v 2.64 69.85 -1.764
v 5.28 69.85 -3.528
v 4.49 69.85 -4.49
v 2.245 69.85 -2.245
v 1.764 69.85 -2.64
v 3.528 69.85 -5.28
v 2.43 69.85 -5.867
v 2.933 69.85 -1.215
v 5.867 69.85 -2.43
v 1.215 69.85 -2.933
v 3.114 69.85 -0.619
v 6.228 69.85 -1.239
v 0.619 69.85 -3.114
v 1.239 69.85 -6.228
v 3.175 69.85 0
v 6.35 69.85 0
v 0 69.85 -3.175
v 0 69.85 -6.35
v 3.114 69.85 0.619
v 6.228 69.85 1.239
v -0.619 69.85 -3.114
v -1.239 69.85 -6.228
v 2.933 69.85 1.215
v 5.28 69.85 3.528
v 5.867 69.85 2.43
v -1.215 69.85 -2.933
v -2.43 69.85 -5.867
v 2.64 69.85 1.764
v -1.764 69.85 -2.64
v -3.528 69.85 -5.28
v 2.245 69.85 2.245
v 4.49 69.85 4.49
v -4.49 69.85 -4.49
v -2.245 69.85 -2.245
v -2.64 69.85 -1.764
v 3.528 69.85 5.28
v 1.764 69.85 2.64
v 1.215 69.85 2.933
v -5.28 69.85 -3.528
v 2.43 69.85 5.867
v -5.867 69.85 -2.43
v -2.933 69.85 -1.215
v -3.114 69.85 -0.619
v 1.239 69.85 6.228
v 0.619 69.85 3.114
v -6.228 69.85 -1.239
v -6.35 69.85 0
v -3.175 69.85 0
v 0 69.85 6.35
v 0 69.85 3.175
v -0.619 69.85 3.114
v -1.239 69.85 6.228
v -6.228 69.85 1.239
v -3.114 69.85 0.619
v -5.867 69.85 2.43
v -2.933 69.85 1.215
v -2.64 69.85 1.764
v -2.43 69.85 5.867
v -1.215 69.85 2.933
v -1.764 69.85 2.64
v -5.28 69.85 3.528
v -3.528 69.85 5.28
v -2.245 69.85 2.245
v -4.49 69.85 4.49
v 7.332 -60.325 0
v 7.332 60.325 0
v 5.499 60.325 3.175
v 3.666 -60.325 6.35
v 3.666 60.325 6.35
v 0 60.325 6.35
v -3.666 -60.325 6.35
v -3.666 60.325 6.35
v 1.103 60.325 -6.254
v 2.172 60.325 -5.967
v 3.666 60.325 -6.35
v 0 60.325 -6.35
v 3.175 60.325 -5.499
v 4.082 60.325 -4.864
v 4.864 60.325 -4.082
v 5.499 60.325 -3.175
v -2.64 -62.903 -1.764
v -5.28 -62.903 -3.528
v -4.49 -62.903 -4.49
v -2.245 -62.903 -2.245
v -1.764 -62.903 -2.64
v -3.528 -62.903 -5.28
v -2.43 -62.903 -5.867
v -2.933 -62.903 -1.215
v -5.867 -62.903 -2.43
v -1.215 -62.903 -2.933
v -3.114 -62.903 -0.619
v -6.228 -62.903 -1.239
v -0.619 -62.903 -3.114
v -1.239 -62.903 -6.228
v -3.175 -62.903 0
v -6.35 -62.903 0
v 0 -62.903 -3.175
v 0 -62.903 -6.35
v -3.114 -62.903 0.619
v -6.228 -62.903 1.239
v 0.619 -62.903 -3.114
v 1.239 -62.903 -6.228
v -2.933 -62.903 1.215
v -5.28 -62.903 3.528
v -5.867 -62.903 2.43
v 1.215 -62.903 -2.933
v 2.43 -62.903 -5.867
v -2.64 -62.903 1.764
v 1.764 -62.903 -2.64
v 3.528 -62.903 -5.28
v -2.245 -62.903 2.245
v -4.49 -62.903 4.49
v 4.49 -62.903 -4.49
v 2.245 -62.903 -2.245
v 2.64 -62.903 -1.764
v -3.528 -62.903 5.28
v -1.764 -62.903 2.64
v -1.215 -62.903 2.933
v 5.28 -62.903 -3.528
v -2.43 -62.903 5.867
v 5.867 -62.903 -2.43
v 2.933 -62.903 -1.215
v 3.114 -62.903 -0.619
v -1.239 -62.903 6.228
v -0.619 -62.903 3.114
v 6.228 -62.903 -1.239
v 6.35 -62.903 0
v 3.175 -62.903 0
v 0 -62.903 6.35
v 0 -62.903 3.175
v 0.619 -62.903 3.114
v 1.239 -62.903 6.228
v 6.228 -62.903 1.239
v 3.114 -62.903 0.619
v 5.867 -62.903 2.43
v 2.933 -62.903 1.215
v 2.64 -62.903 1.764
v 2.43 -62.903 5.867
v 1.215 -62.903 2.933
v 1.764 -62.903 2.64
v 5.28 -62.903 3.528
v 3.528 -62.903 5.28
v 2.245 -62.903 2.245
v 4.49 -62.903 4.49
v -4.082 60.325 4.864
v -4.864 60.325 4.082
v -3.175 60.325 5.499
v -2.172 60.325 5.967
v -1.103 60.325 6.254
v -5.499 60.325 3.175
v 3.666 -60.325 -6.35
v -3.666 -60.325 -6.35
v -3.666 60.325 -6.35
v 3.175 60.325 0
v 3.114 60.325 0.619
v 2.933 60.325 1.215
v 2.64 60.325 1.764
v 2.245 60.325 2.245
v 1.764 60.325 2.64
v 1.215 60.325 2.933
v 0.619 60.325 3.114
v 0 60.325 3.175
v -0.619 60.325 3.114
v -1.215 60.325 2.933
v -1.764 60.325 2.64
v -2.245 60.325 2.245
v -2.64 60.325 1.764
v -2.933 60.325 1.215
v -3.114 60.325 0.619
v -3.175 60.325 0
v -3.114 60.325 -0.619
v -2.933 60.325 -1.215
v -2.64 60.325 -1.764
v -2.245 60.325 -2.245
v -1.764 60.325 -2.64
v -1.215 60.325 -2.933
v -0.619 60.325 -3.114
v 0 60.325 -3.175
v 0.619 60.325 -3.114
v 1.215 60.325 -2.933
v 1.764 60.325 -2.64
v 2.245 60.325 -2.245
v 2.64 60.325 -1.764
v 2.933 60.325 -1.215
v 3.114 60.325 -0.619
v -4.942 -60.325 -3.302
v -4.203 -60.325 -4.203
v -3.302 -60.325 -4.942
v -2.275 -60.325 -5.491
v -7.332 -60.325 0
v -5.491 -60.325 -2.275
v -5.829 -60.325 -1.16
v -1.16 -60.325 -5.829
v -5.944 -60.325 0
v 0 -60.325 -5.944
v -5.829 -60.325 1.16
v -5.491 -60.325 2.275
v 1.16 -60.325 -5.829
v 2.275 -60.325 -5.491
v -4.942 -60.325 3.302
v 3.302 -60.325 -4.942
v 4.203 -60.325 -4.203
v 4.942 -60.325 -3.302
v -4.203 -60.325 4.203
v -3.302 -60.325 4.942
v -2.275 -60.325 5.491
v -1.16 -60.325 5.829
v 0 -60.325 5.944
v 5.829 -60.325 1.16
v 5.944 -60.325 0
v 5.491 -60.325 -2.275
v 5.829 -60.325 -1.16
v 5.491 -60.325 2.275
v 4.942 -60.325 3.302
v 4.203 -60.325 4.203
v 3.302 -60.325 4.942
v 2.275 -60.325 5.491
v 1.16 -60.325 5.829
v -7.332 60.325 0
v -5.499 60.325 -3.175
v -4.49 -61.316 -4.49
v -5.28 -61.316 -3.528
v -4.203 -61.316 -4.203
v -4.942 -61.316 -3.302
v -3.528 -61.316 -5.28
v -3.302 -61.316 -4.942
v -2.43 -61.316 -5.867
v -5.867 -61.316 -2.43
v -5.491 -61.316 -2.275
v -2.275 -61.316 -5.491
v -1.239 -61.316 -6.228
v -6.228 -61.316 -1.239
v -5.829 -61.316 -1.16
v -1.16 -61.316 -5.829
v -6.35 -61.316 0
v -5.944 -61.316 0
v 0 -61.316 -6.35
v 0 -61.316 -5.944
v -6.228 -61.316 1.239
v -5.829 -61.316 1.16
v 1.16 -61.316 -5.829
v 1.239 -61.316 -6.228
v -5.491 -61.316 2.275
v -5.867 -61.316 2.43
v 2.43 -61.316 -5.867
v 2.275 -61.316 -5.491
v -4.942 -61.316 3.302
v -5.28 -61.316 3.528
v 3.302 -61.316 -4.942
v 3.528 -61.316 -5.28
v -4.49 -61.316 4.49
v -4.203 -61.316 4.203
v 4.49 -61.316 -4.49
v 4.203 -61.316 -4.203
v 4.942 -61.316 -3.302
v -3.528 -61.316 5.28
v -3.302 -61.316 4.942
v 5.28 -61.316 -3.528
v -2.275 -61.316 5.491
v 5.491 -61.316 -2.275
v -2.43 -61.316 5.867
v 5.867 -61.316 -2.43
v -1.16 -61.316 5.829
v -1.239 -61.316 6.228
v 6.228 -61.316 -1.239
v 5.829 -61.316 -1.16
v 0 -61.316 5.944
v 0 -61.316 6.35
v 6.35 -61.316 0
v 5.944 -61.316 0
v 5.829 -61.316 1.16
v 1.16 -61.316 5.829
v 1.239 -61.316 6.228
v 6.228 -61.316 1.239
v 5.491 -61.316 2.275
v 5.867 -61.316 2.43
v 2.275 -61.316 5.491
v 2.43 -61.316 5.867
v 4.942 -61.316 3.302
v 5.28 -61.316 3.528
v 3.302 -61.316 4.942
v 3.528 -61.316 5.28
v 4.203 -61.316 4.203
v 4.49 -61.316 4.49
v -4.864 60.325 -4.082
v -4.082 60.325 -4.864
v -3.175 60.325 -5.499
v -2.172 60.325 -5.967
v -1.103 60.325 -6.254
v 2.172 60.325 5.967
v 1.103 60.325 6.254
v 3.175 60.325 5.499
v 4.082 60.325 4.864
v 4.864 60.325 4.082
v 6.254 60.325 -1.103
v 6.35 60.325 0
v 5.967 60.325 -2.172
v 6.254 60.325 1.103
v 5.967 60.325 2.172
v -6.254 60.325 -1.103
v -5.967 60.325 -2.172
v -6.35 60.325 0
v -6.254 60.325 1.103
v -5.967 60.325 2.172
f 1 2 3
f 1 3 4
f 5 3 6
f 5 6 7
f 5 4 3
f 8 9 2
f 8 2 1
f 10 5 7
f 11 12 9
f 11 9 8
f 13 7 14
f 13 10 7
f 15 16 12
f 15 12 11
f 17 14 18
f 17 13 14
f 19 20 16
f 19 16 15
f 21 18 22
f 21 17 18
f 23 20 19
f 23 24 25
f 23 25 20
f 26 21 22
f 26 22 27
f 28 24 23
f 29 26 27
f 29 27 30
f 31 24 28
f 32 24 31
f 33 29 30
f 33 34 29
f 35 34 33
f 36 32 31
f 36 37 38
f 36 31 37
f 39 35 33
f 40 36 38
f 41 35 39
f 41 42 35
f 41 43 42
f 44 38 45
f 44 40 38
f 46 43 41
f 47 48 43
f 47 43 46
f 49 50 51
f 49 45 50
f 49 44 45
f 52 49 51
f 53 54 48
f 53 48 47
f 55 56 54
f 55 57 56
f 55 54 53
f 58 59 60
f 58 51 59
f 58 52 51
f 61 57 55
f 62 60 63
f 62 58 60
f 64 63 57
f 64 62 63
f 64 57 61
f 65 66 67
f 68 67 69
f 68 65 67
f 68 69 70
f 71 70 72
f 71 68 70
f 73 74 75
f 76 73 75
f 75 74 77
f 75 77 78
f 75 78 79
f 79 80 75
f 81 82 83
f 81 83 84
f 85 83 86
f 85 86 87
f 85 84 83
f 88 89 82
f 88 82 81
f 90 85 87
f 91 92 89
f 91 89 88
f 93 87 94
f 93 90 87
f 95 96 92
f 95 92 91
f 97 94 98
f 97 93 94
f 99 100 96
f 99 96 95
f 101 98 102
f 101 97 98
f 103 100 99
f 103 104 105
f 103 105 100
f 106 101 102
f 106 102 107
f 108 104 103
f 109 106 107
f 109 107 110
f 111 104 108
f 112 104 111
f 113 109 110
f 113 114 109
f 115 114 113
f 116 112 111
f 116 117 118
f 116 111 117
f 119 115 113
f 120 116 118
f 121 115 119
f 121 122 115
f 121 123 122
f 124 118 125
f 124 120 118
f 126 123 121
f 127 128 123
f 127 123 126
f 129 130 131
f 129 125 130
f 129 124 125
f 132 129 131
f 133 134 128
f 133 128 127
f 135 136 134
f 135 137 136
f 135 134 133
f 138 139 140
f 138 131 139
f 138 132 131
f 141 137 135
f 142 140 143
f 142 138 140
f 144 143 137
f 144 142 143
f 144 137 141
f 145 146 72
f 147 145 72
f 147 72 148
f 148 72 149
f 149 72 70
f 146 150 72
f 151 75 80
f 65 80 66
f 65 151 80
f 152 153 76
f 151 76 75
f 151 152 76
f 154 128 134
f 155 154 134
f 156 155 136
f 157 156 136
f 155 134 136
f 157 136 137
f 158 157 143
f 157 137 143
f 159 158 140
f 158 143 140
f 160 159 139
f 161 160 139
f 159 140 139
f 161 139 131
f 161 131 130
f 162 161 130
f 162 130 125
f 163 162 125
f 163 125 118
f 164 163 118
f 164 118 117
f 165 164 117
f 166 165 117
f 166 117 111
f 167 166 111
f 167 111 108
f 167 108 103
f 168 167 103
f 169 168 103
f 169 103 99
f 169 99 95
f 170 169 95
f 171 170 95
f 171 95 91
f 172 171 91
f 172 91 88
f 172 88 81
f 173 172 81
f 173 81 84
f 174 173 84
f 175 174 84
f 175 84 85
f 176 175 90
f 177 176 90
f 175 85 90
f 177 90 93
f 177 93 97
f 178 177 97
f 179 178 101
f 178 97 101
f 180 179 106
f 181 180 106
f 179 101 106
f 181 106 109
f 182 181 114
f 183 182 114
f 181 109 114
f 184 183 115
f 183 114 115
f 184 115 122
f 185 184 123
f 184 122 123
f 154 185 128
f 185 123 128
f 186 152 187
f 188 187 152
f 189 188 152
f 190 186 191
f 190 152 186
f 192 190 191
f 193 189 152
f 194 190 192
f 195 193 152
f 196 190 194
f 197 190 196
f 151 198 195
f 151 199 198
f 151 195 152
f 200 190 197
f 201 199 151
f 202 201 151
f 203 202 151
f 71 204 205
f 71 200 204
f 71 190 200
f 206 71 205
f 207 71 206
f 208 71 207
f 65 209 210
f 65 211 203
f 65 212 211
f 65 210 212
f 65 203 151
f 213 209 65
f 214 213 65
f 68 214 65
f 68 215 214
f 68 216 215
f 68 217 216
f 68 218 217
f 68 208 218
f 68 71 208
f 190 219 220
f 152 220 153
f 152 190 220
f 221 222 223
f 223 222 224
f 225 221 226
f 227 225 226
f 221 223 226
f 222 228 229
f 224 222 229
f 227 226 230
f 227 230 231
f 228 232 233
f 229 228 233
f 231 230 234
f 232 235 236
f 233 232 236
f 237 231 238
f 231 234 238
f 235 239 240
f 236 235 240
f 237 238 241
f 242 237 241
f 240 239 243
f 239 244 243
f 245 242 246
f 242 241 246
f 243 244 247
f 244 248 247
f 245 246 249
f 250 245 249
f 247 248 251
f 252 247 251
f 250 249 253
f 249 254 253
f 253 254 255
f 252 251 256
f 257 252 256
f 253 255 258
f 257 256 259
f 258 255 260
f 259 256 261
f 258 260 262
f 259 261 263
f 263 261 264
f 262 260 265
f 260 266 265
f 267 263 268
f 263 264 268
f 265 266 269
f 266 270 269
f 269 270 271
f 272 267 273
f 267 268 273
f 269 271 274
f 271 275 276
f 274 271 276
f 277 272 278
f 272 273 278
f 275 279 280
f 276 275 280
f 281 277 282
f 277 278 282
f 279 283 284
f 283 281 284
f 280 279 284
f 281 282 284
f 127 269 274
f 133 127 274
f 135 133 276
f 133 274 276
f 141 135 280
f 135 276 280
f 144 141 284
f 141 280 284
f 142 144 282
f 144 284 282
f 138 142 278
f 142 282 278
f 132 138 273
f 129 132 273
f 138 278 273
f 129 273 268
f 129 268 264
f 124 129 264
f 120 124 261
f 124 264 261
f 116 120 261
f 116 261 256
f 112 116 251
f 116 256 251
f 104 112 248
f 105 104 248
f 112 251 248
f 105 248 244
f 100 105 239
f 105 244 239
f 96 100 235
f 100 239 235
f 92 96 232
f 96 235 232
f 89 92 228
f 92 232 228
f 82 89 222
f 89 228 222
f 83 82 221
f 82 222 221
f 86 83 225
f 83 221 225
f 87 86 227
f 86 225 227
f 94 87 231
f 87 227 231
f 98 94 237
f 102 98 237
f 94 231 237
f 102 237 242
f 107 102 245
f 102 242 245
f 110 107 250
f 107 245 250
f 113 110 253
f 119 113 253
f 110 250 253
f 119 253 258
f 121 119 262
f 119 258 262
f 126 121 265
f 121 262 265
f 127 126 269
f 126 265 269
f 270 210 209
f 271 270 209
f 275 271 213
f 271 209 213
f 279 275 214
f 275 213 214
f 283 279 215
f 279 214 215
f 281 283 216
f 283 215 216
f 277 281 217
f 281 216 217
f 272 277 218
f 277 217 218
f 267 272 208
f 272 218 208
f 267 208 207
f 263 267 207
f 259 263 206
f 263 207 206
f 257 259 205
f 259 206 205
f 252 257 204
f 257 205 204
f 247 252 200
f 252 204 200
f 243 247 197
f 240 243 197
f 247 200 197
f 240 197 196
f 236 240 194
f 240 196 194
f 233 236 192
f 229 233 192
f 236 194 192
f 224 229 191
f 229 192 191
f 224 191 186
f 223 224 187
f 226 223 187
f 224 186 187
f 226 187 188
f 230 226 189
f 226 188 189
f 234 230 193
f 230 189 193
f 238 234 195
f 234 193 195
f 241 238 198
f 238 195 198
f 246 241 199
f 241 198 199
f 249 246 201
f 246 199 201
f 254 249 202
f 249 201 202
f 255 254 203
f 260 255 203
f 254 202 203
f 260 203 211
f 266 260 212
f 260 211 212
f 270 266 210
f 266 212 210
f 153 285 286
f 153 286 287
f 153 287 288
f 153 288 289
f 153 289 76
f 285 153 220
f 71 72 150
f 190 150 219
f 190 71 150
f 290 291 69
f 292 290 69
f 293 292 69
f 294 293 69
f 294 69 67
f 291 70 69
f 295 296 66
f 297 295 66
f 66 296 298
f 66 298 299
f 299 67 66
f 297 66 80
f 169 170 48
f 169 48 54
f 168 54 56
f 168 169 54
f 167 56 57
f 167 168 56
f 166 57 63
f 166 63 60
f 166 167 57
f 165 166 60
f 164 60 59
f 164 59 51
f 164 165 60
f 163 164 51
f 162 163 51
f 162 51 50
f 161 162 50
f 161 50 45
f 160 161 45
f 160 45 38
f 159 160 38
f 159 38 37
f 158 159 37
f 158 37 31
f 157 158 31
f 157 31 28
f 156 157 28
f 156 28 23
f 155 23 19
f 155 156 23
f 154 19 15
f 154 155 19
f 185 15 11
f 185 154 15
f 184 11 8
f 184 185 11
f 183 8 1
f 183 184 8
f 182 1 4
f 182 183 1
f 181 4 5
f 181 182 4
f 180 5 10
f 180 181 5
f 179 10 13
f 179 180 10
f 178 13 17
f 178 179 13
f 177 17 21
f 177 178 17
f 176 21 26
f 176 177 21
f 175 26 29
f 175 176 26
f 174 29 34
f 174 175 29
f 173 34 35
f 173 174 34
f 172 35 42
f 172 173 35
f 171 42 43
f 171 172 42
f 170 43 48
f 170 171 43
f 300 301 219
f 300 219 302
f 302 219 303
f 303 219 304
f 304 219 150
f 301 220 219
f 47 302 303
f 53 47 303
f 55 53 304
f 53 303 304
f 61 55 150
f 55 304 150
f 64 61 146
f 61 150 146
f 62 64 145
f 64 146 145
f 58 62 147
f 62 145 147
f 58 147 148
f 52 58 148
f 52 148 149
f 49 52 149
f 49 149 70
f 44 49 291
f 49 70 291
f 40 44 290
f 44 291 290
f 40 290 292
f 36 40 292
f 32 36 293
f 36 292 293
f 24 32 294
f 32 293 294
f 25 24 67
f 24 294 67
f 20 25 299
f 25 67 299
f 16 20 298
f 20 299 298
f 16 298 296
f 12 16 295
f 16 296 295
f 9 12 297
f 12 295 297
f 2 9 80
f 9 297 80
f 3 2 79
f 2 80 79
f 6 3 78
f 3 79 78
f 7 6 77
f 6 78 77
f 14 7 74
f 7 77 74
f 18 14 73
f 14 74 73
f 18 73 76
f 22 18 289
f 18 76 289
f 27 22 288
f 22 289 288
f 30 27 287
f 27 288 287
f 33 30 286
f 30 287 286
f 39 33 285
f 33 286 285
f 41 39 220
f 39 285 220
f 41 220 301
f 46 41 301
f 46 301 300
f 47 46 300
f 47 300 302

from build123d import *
from build123d import SkipClean  # not in build123d's __all__

# Parameters (mm, degrees)
F1_DEPTH      = 60.325
F1_DEPTH_BACK = 60.325
F2_R          = 5.9436
F3_DEPTH      = 0.9906
F4_R          = 6.35
F5_DEPTH      = 1.5875
F6_R          = 3.175
F7_DEPTH      = 123.2291
F8_R          = 6.35
F8_R_2        = 3.175
F9_DEPTH      = 9.525


with BuildPart() as f1:
    # F0 (on Front) → F1 (new body, two sides)
    with BuildSketch(Plane.XZ) as f1_sk:
        Polygon((3.6661742094, 6.35), (-3.6661742094, 6.35), (-7.3323484187, 0), (-3.6661742094, -6.35), (3.6661742094, -6.35), (7.3323484187, 0), align=None)
    extrude(amount=F1_DEPTH)
    extrude(f1_sk.sketch, amount=-F1_DEPTH_BACK)

    # F2 (on face) → F3 (join)
    with BuildSketch(Plane.XZ.offset(60.325)):
        Circle(F2_R)
    extrude(amount=F3_DEPTH)

    # F4 (on face) → F5 (join)
    with BuildSketch(Plane.XZ.offset(61.3156)):
        Circle(F4_R)
    extrude(amount=F5_DEPTH)

    # F6 (on face) → F7 (cut, through all)
    with BuildSketch(Plane.XZ.offset(62.9031)):
        Circle(F6_R)
    extrude(amount=-F7_DEPTH, mode=Mode.SUBTRACT)

    # F8 (on face) → F9 (join)
    with BuildSketch(Plane(origin=(0, 60.325, 0), x_dir=(-1, 0, 0), z_dir=(0, 1, 0))):
        Circle(F8_R)
        Circle(F8_R_2, mode=Mode.SUBTRACT)
    with SkipClean():  # cleaning this boolean's faces spoils the solid; the shape is the same uncleaned
        extrude(amount=F9_DEPTH)


solid = f1.part
